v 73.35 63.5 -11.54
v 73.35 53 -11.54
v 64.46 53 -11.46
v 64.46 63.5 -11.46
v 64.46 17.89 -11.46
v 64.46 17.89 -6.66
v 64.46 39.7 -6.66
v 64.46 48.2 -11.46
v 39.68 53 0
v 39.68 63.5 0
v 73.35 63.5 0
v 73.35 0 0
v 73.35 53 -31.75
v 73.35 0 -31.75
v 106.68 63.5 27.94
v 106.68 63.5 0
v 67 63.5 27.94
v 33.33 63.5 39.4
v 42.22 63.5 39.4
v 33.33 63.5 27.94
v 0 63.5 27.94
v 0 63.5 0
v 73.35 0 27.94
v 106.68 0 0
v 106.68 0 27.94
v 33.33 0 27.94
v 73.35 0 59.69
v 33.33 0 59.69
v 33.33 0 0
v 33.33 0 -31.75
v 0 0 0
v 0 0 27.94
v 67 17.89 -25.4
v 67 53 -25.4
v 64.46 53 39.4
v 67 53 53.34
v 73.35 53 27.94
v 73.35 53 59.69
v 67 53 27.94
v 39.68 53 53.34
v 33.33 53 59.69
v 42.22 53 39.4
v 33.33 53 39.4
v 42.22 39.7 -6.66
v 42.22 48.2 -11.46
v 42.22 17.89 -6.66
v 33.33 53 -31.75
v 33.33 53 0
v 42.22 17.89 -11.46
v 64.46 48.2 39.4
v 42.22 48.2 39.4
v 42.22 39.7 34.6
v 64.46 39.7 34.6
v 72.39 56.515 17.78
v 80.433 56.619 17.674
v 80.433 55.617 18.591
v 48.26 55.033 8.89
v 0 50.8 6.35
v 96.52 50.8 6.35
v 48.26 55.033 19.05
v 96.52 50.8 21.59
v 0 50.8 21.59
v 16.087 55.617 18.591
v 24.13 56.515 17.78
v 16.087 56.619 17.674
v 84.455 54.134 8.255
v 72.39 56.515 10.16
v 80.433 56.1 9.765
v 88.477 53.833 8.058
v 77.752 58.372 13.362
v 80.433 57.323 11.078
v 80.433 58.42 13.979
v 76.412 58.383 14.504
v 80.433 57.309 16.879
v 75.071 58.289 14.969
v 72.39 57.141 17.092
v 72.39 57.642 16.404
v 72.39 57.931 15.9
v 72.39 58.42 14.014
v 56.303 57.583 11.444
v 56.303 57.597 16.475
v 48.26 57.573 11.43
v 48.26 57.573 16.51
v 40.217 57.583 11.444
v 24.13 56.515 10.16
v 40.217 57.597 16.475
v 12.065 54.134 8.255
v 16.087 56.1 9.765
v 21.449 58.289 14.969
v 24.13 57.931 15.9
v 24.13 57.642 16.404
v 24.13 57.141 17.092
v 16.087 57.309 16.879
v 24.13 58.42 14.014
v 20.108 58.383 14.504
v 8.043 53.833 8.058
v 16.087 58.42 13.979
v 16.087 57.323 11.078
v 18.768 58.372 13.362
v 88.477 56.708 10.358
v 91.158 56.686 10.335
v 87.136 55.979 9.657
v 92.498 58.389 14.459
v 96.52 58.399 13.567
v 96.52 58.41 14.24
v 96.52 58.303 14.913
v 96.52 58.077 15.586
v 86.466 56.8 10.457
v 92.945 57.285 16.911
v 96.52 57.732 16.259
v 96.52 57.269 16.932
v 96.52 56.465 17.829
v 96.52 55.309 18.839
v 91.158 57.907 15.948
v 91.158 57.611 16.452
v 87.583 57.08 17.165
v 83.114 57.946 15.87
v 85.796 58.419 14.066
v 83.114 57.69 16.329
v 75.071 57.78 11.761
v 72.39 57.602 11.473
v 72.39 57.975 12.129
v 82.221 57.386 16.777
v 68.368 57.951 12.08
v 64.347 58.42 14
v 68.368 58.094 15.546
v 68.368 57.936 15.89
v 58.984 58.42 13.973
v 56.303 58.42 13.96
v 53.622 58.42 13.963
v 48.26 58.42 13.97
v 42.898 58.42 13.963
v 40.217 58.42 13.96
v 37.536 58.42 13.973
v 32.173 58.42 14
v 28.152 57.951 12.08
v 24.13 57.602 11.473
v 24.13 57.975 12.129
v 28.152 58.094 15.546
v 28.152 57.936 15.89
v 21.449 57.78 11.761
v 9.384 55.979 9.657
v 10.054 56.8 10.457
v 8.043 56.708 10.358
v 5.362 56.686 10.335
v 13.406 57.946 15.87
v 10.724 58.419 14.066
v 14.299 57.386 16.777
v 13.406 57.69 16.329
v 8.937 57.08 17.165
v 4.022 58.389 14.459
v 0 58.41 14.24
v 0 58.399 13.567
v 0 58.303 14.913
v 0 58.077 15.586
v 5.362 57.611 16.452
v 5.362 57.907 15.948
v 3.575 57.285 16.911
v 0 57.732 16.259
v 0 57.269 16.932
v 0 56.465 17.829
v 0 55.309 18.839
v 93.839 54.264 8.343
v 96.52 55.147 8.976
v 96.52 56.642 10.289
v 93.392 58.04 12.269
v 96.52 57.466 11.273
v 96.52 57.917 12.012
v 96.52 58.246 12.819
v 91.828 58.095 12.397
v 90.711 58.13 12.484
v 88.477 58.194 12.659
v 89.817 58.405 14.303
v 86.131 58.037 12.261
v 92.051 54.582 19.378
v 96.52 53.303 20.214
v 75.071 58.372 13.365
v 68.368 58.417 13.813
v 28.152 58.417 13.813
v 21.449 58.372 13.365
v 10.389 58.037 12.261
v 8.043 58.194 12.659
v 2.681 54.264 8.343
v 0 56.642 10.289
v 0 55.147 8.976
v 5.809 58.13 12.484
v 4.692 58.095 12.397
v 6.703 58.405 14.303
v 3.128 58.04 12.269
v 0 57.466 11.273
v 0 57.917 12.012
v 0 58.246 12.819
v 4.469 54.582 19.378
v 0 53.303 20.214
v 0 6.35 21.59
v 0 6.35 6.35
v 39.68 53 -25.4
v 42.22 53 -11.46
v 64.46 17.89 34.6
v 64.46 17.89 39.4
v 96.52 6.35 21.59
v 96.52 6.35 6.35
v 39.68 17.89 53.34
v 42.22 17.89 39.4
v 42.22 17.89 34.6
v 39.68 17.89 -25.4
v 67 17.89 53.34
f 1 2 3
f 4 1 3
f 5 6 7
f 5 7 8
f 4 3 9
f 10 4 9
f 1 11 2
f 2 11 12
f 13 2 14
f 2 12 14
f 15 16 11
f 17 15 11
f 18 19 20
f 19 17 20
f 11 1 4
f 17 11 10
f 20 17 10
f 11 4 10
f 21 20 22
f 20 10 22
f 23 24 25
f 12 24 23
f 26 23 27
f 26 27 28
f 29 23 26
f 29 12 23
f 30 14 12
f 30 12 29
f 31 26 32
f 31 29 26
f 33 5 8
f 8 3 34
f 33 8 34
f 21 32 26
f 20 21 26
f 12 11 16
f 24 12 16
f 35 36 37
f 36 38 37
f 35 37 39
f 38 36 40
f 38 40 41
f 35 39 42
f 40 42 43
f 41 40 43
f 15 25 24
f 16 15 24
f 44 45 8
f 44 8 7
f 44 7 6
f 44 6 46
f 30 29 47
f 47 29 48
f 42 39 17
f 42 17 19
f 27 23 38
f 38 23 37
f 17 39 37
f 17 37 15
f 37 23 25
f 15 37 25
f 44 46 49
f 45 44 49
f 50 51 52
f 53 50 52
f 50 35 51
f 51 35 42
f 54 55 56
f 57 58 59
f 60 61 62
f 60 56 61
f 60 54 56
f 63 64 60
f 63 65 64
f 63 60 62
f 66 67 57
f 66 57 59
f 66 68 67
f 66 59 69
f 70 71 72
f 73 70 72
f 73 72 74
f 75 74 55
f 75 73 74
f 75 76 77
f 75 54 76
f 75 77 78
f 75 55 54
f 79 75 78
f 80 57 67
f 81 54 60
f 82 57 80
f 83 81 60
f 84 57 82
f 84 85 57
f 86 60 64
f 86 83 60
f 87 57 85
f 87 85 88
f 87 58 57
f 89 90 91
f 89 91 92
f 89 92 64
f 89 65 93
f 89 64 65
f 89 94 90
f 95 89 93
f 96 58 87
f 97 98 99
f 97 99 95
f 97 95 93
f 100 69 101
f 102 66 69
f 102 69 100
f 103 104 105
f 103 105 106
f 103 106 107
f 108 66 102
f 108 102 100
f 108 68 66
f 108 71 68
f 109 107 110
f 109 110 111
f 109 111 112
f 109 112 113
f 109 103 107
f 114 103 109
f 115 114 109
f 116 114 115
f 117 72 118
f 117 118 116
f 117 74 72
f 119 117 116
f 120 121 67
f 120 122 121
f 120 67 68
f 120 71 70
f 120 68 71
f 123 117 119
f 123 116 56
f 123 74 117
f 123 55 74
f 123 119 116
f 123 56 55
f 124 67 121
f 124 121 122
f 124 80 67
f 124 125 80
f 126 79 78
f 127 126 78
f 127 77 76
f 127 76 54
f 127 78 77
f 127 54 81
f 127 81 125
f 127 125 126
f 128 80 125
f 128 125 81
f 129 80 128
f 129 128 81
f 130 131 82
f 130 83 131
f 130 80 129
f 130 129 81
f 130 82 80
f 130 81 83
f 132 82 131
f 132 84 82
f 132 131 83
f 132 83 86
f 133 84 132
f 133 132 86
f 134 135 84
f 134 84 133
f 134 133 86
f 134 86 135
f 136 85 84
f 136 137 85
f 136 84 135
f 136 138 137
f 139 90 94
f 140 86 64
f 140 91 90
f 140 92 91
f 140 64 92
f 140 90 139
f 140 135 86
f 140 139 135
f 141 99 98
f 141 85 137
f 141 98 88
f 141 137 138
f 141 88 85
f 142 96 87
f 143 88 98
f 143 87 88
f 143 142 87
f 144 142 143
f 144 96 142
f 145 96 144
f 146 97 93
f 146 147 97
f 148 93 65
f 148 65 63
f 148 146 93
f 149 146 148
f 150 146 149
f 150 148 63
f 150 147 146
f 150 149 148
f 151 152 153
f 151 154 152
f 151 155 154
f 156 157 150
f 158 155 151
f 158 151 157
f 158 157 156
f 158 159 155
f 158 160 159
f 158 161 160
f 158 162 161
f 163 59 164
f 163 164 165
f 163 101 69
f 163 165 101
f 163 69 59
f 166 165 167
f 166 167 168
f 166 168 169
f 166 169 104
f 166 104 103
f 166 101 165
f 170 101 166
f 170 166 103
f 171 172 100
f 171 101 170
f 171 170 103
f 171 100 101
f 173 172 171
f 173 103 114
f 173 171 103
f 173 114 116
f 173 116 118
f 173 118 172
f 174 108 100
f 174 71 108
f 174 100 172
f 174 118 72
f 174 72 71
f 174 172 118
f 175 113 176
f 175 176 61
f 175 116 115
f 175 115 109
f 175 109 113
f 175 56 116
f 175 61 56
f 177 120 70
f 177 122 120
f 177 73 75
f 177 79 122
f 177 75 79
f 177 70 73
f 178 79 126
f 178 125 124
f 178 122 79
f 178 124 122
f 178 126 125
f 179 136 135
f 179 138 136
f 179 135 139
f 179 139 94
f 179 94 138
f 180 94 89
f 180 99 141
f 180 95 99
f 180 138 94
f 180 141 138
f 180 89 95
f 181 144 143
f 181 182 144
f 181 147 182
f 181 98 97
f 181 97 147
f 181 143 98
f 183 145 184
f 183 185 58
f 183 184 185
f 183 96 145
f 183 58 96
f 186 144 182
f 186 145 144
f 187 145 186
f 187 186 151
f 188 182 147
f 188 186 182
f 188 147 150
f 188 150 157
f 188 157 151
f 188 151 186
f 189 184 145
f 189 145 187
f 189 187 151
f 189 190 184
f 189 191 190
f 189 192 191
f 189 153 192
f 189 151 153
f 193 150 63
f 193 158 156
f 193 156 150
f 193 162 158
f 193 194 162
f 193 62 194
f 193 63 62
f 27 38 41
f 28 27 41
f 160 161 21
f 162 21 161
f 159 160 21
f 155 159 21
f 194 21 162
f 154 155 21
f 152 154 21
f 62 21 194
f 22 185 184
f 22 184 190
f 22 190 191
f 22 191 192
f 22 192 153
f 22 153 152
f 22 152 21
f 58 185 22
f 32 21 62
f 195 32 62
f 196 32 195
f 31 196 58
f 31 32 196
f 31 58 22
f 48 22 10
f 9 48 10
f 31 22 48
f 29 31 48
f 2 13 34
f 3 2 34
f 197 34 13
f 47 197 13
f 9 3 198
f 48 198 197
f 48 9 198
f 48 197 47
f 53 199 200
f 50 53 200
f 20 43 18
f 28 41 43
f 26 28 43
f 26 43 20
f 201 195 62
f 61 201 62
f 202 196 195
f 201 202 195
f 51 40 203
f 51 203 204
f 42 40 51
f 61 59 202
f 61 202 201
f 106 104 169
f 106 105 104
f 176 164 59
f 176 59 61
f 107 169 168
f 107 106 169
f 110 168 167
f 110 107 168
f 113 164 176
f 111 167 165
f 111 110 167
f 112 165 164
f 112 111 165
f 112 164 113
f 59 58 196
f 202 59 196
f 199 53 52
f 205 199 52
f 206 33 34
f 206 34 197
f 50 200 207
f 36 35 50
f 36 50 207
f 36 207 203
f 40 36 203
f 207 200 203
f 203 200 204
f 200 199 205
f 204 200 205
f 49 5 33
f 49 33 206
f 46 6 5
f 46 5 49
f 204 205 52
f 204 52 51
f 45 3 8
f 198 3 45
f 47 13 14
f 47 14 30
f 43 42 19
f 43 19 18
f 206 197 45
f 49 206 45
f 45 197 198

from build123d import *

# Parameters (mm, degrees)
SKETCH1_W            = 106.68
SKETCH1_H            = 27.94
BOSS_EXTRUDE1_DEPTH  = 63.5
CUT_EXTRUDE2_DEPTH   = 96.52
SKETCH38_W           = 40.02
SKETCH38_H           = 63.5
BOSS_EXTRUDE25_DEPTH = 6.66
SKETCH40_W           = 6.35
SKETCH40_H           = 63.5
BOSS_EXTRUDE26_DEPTH = 18.74
SKETCH41_W           = 6.35
SKETCH41_H           = 63.5
BOSS_EXTRUDE27_DEPTH = 18.74
SKETCH43_W           = 27.32
SKETCH43_H           = 17.89
BOSS_EXTRUDE28_DEPTH = 18.74
CUT_EXTRUDE13_DEPTH  = 10.5
SKETCH46_W           = 27.32
SKETCH46_H           = 4.8
BOSS_EXTRUDE29_DEPTH = 4.8
BOSS_EXTRUDE30_DEPTH = 33.36
BOSS_EXTRUDE31_DEPTH = 35.11
BOSS_EXTRUDE32_DEPTH = 35.11
SKETCH52_W           = 40.02
SKETCH52_H           = 53
BOSS_EXTRUDE33_DEPTH = 6.35
SKETCH55_W           = 2.54
SKETCH55_H           = 4.8
BOSS_EXTRUDE37_DEPTH = 35.11
SKETCH56_W           = 2.54
SKETCH56_H           = 4.8
BOSS_EXTRUDE38_DEPTH = 35.11
BOSS_EXTRUDE35_DEPTH = 10.5
BOSS_EXTRUDE36_DEPTH = 10.5


with BuildPart() as part:
    # Sketch1 → Boss-Extrude1 (new body)
    with BuildSketch(Plane(origin=(0, 0, 0), x_dir=(1, 0, 0), z_dir=(0, 1, 0))):
        with Locations((53.34, -13.97)):
            Rectangle(SKETCH1_W, SKETCH1_H)
    extrude(amount=BOSS_EXTRUDE1_DEPTH)

    # Sketch2 → Cut-Extrude2 (cut)
    with BuildSketch(Plane.ZY):
        with BuildLine():
            Line((6.35, 50.8), (6.35, 6.35))
            Line((6.35, 6.35), (21.59, 6.35))
            Line((21.59, 6.35), (21.59, 50.8))
            add(Edge.make_bspline(
                [(6.35, 50.8), (13.97, 66.04), (21.59, 50.8)],
                knots=[0, 0, 0, 1, 1, 1], degree=2))
        make_face()
    extrude(amount=-CUT_EXTRUDE2_DEPTH, mode=Mode.SUBTRACT)

    # Sketch38 → Boss-Extrude25 (add)
    with BuildSketch(Plane(origin=(0, 0, 0), x_dir=(-1, 0, 0), z_dir=(0, 0, -1))):
        with Locations((-53.34, 31.75)):
            Rectangle(SKETCH38_W, SKETCH38_H)
    boss_extrude25 = extrude(amount=BOSS_EXTRUDE25_DEPTH)

    # Sketch40 → Boss-Extrude26 (add)
    with BuildSketch(Plane(origin=(0, 0, -6.66), x_dir=(-1, 0, 0), z_dir=(0, 0, -1))):
        with Locations((-70.175, 31.75)):
            Rectangle(SKETCH40_W, SKETCH40_H)
    boss_extrude26 = extrude(amount=BOSS_EXTRUDE26_DEPTH)

    # Sketch41 → Boss-Extrude27 (add)
    with BuildSketch(Plane(origin=(0, 0, -6.66), x_dir=(-1, 0, 0), z_dir=(0, 0, -1))):
        with Locations((-36.505, 31.75)):
            Rectangle(SKETCH41_W, SKETCH41_H)
    boss_extrude27 = extrude(amount=BOSS_EXTRUDE27_DEPTH)

    # Sketch43 → Boss-Extrude28 (add)
    with BuildSketch(Plane(origin=(0, 0, -6.66), x_dir=(-1, 0, 0), z_dir=(0, 0, -1))):
        with Locations((-53.34, 8.945)):
            Rectangle(SKETCH43_W, SKETCH43_H)
    boss_extrude28 = extrude(amount=BOSS_EXTRUDE28_DEPTH)

    # Sketch44 → Cut-Extrude13 (cut)
    with BuildSketch(Plane(origin=(0, 63.5, 0), x_dir=(1, 0, 0), z_dir=(0, 1, 0))):
        Polygon((73.35, 0), (33.33, 0), (33.33, 25.4), (39.68, 25.4), (39.68, 6.66), (67, 6.66), (67, 25.4), (73.35, 25.4), align=None)
    cut_extrude13 = extrude(amount=-CUT_EXTRUDE13_DEPTH, mode=Mode.SUBTRACT)

    # Sketch46 → Boss-Extrude29 (add)
    with BuildSketch(Plane(origin=(0, 0, -6.66), x_dir=(-1, 0, 0), z_dir=(0, 0, -1))):
        with Locations((-53.34, 50.6)):
            Rectangle(SKETCH46_W, SKETCH46_H)
    boss_extrude29 = extrude(amount=BOSS_EXTRUDE29_DEPTH)

    # Sketch48 → Boss-Extrude30 (add)
    with BuildSketch(Plane(origin=(39.68, 0, 0), x_dir=(0, 0, -1), z_dir=(1, 0, 0))):
        Polygon((11.46, 48.2), (6.66, 39.7), (6.66, 48.2), align=None)
    boss_extrude30 = extrude(amount=BOSS_EXTRUDE30_DEPTH)

    # Sketch50 → Boss-Extrude31 (add)
    with BuildSketch(Plane(origin=(0, 53, 0), x_dir=(1, 0, 0), z_dir=(0, 1, 0))):
        Polygon((64.46, 11.46), (67, 25.4), (67, 11.46), align=None)
    boss_extrude31 = extrude(amount=-BOSS_EXTRUDE31_DEPTH)

    # Sketch51 → Boss-Extrude32 (add)
    with BuildSketch(Plane(origin=(0, 53, 0), x_dir=(1, 0, 0), z_dir=(0, 1, 0))):
        Polygon((42.22, 11.46), (39.68, 11.46), (39.68, 25.4), align=None)
    boss_extrude32 = extrude(amount=-BOSS_EXTRUDE32_DEPTH)

    # Sketch52 → Boss-Extrude33 (add)
    with BuildSketch(Plane(origin=(0, 0, -25.4), x_dir=(-1, 0, 0), z_dir=(0, 0, -1))):
        with Locations((-53.34, 26.5)):
            Rectangle(SKETCH52_W, SKETCH52_H)
    boss_extrude33 = extrude(amount=BOSS_EXTRUDE33_DEPTH)

    # Sketch55 → Boss-Extrude37 (add)
    with BuildSketch(Plane(origin=(0, 17.89, 0), x_dir=(1, 0, 0), z_dir=(0, 1, 0))):
        with Locations((65.73, 9.06)):
            Rectangle(SKETCH55_W, SKETCH55_H)
    boss_extrude37 = extrude(amount=BOSS_EXTRUDE37_DEPTH)

    # Sketch56 → Boss-Extrude38 (add)
    with BuildSketch(Plane(origin=(0, 17.89, 0), x_dir=(1, 0, 0), z_dir=(0, 1, 0))):
        with Locations((40.95, 9.06)):
            Rectangle(SKETCH56_W, SKETCH56_H)
    boss_extrude38 = extrude(amount=BOSS_EXTRUDE38_DEPTH)

    # Mirror5: Boss-Extrude25, Boss-Extrude26, Boss-Extrude27, Boss-Extrude28, Cut-Extrude13, Boss-Extrude29, Boss-Extrude30, Boss-Extrude31, Boss-Extrude32, Boss-Extrude33, Boss-Extrude37, Boss-Extrude38 across plane
    add(boss_extrude25.mirror(Plane(origin=(0, 0, 13.97), x_dir=(1, 0, 0), z_dir=(0, 0, -1))))
    add(boss_extrude26.mirror(Plane(origin=(0, 0, 13.97), x_dir=(1, 0, 0), z_dir=(0, 0, -1))))
    add(boss_extrude27.mirror(Plane(origin=(0, 0, 13.97), x_dir=(1, 0, 0), z_dir=(0, 0, -1))))
    add(boss_extrude28.mirror(Plane(origin=(0, 0, 13.97), x_dir=(1, 0, 0), z_dir=(0, 0, -1))))
    add(cut_extrude13.mirror(Plane(origin=(0, 0, 13.97), x_dir=(1, 0, 0), z_dir=(0, 0, -1))), mode=Mode.SUBTRACT)
    add(boss_extrude29.mirror(Plane(origin=(0, 0, 13.97), x_dir=(1, 0, 0), z_dir=(0, 0, -1))))
    add(boss_extrude30.mirror(Plane(origin=(0, 0, 13.97), x_dir=(1, 0, 0), z_dir=(0, 0, -1))))
    add(boss_extrude31.mirror(Plane(origin=(0, 0, 13.97), x_dir=(1, 0, 0), z_dir=(0, 0, -1))))
    add(boss_extrude32.mirror(Plane(origin=(0, 0, 13.97), x_dir=(1, 0, 0), z_dir=(0, 0, -1))))
    add(boss_extrude33.mirror(Plane(origin=(0, 0, 13.97), x_dir=(1, 0, 0), z_dir=(0, 0, -1))))
    add(boss_extrude37.mirror(Plane(origin=(0, 0, 13.97), x_dir=(1, 0, 0), z_dir=(0, 0, -1))))
    add(boss_extrude38.mirror(Plane(origin=(0, 0, 13.97), x_dir=(1, 0, 0), z_dir=(0, 0, -1))))

    # Sketch53 → Boss-Extrude35 (add)
    with BuildSketch(Plane(origin=(0, 53, 0), x_dir=(1, 0, 0), z_dir=(0, 1, 0))):
        Polygon((64.46, 11.46), (39.68, 0), (73.35, 0), (73.35, 11.539525475), align=None)
    extrude(amount=BOSS_EXTRUDE35_DEPTH)

    # Sketch54 → Boss-Extrude36 (add)
    with BuildSketch(Plane(origin=(0, 53, 0), x_dir=(1, 0, 0), z_dir=(0, 1, 0))):
        Polygon((42.22, -39.4), (33.33, -39.4), (33.33, -27.94), (67, -27.94), align=None)
    extrude(amount=BOSS_EXTRUDE36_DEPTH)


solid = part.part
